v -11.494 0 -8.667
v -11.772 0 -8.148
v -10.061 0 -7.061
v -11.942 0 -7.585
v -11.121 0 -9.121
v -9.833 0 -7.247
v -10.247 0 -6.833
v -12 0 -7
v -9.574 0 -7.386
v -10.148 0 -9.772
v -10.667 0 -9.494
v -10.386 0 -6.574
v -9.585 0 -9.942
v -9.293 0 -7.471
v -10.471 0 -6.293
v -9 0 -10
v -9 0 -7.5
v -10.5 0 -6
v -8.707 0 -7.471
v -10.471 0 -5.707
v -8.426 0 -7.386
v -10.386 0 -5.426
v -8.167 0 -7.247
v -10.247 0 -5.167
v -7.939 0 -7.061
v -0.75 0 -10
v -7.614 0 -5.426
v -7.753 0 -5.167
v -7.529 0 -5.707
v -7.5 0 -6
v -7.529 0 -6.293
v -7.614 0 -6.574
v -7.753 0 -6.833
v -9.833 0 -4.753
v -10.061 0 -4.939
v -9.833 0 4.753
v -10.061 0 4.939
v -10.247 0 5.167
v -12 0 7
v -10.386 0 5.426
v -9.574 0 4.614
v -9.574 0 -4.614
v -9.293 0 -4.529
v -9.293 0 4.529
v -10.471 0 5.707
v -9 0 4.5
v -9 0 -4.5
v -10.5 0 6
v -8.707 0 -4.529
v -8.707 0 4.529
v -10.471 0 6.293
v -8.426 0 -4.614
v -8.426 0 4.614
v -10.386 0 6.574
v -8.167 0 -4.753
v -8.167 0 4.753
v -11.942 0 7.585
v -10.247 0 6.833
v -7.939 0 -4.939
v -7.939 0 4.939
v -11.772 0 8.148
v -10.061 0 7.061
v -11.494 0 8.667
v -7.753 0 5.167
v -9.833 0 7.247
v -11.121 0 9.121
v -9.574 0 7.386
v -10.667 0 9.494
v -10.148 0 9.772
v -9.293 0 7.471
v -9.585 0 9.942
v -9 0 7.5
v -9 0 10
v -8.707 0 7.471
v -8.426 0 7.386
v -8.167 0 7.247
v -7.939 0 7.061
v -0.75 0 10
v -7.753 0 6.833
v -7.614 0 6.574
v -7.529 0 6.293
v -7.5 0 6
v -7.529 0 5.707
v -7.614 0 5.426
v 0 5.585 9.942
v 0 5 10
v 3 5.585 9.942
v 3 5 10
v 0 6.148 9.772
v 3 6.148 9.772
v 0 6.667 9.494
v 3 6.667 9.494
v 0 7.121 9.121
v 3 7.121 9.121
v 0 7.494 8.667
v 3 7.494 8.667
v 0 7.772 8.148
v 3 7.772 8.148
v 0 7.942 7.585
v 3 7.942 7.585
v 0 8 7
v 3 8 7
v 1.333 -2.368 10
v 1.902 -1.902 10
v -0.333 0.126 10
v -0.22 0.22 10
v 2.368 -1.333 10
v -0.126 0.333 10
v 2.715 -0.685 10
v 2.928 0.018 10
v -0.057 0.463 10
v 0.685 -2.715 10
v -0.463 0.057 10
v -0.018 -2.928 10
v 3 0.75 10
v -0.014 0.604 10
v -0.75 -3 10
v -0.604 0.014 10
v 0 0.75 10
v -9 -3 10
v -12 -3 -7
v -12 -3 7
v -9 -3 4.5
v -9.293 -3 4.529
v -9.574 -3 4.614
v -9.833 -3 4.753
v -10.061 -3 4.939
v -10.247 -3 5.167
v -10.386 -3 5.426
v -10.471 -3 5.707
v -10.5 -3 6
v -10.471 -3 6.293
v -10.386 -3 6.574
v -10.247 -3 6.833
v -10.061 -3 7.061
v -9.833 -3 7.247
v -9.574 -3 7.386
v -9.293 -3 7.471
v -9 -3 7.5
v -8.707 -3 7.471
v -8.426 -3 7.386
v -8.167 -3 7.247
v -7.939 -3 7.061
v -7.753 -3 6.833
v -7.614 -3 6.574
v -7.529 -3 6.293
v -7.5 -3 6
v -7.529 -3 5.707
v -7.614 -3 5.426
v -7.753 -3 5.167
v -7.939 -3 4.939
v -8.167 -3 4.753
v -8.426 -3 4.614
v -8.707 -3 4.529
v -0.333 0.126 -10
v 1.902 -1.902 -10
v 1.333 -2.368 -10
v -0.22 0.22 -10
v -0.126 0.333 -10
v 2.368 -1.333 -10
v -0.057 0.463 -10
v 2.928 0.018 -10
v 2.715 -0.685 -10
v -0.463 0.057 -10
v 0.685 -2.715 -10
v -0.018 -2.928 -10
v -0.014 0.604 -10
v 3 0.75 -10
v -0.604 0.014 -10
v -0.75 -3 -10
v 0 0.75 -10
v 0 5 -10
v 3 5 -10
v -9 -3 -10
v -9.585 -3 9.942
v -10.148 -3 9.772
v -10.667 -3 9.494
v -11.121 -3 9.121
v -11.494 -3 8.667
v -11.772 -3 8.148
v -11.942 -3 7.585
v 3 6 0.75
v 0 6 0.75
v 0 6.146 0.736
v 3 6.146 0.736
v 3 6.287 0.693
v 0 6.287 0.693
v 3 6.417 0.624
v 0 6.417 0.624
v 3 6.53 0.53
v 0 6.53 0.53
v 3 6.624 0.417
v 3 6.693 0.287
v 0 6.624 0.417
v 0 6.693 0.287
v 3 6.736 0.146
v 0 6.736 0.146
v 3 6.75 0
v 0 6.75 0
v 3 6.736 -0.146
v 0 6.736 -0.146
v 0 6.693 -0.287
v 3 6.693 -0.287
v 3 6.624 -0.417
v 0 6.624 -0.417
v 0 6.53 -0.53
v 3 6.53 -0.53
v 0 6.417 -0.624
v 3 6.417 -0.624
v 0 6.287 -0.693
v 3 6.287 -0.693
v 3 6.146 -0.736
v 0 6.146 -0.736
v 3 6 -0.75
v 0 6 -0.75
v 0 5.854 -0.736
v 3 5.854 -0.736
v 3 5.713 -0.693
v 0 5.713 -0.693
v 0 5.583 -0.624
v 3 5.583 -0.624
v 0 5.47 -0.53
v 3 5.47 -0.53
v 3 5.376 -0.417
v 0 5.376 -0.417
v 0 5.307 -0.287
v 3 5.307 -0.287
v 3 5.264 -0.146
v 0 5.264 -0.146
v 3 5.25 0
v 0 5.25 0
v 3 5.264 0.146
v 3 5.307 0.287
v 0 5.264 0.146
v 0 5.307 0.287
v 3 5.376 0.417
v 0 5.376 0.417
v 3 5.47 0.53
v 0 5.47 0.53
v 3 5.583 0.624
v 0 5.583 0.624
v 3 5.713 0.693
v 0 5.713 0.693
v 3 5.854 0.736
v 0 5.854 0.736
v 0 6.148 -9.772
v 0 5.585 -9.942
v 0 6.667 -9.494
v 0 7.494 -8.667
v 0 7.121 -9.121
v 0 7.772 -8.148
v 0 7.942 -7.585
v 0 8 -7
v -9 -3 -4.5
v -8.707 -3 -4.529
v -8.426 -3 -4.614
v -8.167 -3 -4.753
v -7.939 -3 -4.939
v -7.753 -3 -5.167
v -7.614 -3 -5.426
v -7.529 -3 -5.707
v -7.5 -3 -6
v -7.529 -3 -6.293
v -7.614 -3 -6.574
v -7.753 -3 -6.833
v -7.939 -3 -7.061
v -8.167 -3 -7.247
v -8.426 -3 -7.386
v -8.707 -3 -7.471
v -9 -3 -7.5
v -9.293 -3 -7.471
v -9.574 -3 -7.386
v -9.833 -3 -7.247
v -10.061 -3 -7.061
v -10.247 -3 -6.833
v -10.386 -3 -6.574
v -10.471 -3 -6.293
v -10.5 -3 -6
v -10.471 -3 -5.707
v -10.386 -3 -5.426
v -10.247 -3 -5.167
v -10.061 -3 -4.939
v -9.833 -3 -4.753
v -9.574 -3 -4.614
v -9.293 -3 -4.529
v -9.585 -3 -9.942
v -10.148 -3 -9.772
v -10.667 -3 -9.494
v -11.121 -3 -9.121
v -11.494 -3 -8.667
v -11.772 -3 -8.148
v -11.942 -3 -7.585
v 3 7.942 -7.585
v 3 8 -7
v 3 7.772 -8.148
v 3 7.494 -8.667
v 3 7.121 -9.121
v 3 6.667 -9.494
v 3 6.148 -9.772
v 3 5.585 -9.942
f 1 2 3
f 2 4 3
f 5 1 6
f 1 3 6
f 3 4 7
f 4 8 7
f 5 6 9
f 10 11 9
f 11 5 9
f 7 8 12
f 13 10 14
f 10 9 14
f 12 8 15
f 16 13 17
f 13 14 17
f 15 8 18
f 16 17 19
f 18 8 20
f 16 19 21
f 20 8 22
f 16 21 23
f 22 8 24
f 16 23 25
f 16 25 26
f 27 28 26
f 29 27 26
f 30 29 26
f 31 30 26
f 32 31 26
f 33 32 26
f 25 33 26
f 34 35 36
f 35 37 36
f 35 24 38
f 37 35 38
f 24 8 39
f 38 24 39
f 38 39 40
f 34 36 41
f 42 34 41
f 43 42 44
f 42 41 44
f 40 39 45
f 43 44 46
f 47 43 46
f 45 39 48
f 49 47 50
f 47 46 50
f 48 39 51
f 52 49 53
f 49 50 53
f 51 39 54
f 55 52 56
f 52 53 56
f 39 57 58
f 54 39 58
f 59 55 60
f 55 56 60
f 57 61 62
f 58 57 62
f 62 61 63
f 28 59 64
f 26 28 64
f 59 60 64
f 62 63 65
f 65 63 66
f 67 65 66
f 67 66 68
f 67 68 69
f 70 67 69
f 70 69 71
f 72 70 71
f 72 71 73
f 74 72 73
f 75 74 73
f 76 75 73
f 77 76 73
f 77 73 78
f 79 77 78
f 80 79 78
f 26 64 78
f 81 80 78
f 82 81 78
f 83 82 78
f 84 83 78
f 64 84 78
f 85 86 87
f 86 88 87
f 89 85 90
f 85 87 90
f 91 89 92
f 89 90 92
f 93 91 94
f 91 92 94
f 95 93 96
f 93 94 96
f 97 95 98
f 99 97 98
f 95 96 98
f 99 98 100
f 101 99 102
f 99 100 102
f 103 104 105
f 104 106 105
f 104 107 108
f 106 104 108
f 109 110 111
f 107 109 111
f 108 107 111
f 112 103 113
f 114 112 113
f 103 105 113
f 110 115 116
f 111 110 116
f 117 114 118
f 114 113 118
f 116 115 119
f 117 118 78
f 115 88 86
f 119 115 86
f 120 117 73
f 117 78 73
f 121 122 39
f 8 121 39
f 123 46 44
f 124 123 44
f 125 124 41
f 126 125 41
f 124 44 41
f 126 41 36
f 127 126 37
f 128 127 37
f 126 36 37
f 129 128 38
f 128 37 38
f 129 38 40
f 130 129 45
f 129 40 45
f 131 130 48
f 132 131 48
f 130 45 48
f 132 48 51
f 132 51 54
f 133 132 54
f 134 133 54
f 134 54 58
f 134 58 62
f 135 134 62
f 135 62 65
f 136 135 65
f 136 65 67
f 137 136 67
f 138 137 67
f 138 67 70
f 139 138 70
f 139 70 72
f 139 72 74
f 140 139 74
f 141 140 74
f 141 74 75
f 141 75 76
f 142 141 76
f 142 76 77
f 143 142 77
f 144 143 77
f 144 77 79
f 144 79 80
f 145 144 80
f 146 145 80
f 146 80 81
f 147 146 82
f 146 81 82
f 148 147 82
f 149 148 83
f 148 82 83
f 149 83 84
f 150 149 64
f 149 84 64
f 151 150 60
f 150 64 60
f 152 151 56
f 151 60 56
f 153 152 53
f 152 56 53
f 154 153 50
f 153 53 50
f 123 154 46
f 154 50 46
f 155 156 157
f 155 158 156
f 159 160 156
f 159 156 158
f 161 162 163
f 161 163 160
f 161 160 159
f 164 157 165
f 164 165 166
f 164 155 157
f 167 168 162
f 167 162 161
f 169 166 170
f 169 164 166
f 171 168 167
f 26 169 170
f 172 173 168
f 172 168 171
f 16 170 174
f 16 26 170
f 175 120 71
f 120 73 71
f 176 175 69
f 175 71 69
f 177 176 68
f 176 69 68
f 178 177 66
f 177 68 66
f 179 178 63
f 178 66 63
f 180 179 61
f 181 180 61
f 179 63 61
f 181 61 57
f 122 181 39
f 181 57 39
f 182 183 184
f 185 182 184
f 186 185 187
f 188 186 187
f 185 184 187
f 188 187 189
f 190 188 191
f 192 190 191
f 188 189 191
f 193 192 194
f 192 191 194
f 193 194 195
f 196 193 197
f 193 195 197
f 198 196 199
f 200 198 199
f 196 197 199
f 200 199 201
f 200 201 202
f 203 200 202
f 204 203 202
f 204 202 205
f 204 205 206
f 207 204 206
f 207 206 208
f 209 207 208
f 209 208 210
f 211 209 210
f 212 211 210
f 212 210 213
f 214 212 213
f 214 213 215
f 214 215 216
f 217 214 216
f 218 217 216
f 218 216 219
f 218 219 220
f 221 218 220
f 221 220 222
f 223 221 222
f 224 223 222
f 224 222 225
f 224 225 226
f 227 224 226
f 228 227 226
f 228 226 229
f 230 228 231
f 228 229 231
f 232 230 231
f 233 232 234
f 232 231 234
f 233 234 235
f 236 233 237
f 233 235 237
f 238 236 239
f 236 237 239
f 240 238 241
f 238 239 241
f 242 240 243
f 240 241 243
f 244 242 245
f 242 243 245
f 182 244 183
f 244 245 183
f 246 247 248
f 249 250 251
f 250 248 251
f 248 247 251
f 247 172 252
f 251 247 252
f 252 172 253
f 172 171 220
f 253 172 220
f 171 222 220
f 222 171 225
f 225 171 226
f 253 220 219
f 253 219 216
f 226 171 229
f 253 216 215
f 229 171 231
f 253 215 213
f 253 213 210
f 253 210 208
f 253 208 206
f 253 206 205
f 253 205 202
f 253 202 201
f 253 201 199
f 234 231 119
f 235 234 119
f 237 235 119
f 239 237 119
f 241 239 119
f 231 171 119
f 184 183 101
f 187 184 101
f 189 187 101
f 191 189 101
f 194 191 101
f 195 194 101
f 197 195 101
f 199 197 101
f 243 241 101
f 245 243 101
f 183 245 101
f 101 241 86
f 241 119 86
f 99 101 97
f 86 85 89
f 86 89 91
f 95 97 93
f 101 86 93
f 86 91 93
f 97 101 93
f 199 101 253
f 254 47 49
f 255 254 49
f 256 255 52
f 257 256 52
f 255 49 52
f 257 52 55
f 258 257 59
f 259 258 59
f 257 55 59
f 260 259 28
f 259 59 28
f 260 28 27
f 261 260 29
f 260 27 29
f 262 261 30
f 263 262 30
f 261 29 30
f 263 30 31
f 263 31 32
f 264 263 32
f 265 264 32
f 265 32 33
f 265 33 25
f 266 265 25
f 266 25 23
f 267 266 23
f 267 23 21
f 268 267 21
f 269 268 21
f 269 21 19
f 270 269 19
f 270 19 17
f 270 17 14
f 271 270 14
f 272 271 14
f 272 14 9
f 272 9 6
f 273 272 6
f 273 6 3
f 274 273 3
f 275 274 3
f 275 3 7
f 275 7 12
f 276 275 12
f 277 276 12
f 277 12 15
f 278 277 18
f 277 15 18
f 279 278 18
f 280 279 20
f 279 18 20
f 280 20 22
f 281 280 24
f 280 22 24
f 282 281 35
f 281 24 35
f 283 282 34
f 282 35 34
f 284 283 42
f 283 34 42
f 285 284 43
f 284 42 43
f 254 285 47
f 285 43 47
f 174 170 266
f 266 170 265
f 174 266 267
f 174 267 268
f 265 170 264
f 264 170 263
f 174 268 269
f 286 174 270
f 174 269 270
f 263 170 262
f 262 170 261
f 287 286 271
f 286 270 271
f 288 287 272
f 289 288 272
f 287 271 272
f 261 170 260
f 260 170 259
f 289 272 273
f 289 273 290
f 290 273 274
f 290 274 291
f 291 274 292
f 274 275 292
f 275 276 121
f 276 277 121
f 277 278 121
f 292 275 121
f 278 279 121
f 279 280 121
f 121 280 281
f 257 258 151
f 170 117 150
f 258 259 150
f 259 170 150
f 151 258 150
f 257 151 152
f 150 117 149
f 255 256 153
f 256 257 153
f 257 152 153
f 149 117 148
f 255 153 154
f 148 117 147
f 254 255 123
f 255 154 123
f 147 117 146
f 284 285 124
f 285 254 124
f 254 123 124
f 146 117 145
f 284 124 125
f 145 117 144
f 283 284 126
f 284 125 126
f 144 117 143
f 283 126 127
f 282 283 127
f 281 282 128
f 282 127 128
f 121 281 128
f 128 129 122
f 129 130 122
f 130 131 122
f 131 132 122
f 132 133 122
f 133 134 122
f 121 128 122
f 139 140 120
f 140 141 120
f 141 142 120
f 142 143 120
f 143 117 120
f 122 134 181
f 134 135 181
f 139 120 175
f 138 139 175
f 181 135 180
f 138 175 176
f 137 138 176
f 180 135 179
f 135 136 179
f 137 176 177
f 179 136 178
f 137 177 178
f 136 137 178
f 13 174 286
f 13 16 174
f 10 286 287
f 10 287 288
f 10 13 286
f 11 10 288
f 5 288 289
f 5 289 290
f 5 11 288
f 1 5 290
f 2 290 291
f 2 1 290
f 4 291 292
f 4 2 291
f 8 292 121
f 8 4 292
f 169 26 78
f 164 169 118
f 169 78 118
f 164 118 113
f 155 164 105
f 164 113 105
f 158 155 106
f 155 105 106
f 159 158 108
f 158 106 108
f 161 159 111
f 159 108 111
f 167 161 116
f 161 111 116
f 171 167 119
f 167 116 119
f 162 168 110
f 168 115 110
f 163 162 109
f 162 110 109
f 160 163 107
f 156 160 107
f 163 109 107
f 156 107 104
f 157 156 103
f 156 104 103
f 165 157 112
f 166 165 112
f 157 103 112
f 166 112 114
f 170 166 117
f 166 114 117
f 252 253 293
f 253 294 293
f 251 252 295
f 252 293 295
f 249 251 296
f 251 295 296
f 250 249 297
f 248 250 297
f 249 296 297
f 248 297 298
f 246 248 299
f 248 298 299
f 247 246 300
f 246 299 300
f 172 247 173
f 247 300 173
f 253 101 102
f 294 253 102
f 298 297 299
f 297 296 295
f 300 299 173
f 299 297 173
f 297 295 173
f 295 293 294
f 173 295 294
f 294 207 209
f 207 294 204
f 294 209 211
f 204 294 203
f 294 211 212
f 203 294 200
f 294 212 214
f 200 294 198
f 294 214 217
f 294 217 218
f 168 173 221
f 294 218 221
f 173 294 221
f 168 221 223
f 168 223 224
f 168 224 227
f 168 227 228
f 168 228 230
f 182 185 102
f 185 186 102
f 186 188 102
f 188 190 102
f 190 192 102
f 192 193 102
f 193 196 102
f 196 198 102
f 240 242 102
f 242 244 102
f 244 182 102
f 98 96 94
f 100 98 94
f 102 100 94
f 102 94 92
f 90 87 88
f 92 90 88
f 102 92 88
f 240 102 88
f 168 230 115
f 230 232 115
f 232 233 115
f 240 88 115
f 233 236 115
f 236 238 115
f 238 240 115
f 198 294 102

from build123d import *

# Parameters (mm, degrees)
BASE_FLANGE1_DEPTH = 10
FILLET1_R          = 3
SKETCH6_R          = 1.5
CUT_EXTRUDE1_DEPTH = 18.549928775
SKETCH7_R          = 0.75
CUT_EXTRUDE2_DEPTH = 18.549928775


# Sheet-metal steps are written as plain solids
with BuildPart() as part:
    # Sketch1 → Base-Flange1 (new, symmetric)
    with BuildSketch(Plane.XY):
        with BuildLine():
            Line((-12, 0), (-0.75, 0))
            ThreePointArc((-0.75, 0), (-0.219669914, 0.219669914), (0, 0.75))
            Line((0, 0.75), (0, 8))
            Line((0, 8), (3, 8))
            Line((3, 8), (3, 0.75))
            ThreePointArc((3, 0.75), (1.901650429, -1.901650429), (-0.75, -3))
            Line((-0.75, -3), (-12, -3))
            Line((-12, -3), (-12, 0))
        make_face()
    extrude(amount=BASE_FLANGE1_DEPTH, both=True)

    # Fillet1
    fillet1_edges = [part.edges().sort_by_distance(p)[0] for p in [
        (-12, -1.5, 10),
        (-12, -1.5, -10),
        (1.5, 8, 10),
        (1.5, 8, -10),
    ]]
    fillet(fillet1_edges, radius=FILLET1_R)

    # Sketch6 → Cut-Extrude1 (cut, through all)
    with BuildSketch(Plane(origin=(0, 0, 0), x_dir=(1, 0, 0), z_dir=(0, 1, 0))):
        with Locations(Location((-9, 6, 0), (0, 0, 270))):
            Circle(SKETCH6_R)
        with Locations(Location((-9, -6, 0), (0, 0, 90))):
            Circle(SKETCH6_R)
    extrude(amount=-CUT_EXTRUDE1_DEPTH, mode=Mode.SUBTRACT)

    # Sketch7 → Cut-Extrude2 (cut, through all)
    with BuildSketch(Plane.ZY):
        with Locations((0, 6)):
            Circle(SKETCH7_R)
    extrude(amount=-CUT_EXTRUDE2_DEPTH, mode=Mode.SUBTRACT)


solid = part.part
